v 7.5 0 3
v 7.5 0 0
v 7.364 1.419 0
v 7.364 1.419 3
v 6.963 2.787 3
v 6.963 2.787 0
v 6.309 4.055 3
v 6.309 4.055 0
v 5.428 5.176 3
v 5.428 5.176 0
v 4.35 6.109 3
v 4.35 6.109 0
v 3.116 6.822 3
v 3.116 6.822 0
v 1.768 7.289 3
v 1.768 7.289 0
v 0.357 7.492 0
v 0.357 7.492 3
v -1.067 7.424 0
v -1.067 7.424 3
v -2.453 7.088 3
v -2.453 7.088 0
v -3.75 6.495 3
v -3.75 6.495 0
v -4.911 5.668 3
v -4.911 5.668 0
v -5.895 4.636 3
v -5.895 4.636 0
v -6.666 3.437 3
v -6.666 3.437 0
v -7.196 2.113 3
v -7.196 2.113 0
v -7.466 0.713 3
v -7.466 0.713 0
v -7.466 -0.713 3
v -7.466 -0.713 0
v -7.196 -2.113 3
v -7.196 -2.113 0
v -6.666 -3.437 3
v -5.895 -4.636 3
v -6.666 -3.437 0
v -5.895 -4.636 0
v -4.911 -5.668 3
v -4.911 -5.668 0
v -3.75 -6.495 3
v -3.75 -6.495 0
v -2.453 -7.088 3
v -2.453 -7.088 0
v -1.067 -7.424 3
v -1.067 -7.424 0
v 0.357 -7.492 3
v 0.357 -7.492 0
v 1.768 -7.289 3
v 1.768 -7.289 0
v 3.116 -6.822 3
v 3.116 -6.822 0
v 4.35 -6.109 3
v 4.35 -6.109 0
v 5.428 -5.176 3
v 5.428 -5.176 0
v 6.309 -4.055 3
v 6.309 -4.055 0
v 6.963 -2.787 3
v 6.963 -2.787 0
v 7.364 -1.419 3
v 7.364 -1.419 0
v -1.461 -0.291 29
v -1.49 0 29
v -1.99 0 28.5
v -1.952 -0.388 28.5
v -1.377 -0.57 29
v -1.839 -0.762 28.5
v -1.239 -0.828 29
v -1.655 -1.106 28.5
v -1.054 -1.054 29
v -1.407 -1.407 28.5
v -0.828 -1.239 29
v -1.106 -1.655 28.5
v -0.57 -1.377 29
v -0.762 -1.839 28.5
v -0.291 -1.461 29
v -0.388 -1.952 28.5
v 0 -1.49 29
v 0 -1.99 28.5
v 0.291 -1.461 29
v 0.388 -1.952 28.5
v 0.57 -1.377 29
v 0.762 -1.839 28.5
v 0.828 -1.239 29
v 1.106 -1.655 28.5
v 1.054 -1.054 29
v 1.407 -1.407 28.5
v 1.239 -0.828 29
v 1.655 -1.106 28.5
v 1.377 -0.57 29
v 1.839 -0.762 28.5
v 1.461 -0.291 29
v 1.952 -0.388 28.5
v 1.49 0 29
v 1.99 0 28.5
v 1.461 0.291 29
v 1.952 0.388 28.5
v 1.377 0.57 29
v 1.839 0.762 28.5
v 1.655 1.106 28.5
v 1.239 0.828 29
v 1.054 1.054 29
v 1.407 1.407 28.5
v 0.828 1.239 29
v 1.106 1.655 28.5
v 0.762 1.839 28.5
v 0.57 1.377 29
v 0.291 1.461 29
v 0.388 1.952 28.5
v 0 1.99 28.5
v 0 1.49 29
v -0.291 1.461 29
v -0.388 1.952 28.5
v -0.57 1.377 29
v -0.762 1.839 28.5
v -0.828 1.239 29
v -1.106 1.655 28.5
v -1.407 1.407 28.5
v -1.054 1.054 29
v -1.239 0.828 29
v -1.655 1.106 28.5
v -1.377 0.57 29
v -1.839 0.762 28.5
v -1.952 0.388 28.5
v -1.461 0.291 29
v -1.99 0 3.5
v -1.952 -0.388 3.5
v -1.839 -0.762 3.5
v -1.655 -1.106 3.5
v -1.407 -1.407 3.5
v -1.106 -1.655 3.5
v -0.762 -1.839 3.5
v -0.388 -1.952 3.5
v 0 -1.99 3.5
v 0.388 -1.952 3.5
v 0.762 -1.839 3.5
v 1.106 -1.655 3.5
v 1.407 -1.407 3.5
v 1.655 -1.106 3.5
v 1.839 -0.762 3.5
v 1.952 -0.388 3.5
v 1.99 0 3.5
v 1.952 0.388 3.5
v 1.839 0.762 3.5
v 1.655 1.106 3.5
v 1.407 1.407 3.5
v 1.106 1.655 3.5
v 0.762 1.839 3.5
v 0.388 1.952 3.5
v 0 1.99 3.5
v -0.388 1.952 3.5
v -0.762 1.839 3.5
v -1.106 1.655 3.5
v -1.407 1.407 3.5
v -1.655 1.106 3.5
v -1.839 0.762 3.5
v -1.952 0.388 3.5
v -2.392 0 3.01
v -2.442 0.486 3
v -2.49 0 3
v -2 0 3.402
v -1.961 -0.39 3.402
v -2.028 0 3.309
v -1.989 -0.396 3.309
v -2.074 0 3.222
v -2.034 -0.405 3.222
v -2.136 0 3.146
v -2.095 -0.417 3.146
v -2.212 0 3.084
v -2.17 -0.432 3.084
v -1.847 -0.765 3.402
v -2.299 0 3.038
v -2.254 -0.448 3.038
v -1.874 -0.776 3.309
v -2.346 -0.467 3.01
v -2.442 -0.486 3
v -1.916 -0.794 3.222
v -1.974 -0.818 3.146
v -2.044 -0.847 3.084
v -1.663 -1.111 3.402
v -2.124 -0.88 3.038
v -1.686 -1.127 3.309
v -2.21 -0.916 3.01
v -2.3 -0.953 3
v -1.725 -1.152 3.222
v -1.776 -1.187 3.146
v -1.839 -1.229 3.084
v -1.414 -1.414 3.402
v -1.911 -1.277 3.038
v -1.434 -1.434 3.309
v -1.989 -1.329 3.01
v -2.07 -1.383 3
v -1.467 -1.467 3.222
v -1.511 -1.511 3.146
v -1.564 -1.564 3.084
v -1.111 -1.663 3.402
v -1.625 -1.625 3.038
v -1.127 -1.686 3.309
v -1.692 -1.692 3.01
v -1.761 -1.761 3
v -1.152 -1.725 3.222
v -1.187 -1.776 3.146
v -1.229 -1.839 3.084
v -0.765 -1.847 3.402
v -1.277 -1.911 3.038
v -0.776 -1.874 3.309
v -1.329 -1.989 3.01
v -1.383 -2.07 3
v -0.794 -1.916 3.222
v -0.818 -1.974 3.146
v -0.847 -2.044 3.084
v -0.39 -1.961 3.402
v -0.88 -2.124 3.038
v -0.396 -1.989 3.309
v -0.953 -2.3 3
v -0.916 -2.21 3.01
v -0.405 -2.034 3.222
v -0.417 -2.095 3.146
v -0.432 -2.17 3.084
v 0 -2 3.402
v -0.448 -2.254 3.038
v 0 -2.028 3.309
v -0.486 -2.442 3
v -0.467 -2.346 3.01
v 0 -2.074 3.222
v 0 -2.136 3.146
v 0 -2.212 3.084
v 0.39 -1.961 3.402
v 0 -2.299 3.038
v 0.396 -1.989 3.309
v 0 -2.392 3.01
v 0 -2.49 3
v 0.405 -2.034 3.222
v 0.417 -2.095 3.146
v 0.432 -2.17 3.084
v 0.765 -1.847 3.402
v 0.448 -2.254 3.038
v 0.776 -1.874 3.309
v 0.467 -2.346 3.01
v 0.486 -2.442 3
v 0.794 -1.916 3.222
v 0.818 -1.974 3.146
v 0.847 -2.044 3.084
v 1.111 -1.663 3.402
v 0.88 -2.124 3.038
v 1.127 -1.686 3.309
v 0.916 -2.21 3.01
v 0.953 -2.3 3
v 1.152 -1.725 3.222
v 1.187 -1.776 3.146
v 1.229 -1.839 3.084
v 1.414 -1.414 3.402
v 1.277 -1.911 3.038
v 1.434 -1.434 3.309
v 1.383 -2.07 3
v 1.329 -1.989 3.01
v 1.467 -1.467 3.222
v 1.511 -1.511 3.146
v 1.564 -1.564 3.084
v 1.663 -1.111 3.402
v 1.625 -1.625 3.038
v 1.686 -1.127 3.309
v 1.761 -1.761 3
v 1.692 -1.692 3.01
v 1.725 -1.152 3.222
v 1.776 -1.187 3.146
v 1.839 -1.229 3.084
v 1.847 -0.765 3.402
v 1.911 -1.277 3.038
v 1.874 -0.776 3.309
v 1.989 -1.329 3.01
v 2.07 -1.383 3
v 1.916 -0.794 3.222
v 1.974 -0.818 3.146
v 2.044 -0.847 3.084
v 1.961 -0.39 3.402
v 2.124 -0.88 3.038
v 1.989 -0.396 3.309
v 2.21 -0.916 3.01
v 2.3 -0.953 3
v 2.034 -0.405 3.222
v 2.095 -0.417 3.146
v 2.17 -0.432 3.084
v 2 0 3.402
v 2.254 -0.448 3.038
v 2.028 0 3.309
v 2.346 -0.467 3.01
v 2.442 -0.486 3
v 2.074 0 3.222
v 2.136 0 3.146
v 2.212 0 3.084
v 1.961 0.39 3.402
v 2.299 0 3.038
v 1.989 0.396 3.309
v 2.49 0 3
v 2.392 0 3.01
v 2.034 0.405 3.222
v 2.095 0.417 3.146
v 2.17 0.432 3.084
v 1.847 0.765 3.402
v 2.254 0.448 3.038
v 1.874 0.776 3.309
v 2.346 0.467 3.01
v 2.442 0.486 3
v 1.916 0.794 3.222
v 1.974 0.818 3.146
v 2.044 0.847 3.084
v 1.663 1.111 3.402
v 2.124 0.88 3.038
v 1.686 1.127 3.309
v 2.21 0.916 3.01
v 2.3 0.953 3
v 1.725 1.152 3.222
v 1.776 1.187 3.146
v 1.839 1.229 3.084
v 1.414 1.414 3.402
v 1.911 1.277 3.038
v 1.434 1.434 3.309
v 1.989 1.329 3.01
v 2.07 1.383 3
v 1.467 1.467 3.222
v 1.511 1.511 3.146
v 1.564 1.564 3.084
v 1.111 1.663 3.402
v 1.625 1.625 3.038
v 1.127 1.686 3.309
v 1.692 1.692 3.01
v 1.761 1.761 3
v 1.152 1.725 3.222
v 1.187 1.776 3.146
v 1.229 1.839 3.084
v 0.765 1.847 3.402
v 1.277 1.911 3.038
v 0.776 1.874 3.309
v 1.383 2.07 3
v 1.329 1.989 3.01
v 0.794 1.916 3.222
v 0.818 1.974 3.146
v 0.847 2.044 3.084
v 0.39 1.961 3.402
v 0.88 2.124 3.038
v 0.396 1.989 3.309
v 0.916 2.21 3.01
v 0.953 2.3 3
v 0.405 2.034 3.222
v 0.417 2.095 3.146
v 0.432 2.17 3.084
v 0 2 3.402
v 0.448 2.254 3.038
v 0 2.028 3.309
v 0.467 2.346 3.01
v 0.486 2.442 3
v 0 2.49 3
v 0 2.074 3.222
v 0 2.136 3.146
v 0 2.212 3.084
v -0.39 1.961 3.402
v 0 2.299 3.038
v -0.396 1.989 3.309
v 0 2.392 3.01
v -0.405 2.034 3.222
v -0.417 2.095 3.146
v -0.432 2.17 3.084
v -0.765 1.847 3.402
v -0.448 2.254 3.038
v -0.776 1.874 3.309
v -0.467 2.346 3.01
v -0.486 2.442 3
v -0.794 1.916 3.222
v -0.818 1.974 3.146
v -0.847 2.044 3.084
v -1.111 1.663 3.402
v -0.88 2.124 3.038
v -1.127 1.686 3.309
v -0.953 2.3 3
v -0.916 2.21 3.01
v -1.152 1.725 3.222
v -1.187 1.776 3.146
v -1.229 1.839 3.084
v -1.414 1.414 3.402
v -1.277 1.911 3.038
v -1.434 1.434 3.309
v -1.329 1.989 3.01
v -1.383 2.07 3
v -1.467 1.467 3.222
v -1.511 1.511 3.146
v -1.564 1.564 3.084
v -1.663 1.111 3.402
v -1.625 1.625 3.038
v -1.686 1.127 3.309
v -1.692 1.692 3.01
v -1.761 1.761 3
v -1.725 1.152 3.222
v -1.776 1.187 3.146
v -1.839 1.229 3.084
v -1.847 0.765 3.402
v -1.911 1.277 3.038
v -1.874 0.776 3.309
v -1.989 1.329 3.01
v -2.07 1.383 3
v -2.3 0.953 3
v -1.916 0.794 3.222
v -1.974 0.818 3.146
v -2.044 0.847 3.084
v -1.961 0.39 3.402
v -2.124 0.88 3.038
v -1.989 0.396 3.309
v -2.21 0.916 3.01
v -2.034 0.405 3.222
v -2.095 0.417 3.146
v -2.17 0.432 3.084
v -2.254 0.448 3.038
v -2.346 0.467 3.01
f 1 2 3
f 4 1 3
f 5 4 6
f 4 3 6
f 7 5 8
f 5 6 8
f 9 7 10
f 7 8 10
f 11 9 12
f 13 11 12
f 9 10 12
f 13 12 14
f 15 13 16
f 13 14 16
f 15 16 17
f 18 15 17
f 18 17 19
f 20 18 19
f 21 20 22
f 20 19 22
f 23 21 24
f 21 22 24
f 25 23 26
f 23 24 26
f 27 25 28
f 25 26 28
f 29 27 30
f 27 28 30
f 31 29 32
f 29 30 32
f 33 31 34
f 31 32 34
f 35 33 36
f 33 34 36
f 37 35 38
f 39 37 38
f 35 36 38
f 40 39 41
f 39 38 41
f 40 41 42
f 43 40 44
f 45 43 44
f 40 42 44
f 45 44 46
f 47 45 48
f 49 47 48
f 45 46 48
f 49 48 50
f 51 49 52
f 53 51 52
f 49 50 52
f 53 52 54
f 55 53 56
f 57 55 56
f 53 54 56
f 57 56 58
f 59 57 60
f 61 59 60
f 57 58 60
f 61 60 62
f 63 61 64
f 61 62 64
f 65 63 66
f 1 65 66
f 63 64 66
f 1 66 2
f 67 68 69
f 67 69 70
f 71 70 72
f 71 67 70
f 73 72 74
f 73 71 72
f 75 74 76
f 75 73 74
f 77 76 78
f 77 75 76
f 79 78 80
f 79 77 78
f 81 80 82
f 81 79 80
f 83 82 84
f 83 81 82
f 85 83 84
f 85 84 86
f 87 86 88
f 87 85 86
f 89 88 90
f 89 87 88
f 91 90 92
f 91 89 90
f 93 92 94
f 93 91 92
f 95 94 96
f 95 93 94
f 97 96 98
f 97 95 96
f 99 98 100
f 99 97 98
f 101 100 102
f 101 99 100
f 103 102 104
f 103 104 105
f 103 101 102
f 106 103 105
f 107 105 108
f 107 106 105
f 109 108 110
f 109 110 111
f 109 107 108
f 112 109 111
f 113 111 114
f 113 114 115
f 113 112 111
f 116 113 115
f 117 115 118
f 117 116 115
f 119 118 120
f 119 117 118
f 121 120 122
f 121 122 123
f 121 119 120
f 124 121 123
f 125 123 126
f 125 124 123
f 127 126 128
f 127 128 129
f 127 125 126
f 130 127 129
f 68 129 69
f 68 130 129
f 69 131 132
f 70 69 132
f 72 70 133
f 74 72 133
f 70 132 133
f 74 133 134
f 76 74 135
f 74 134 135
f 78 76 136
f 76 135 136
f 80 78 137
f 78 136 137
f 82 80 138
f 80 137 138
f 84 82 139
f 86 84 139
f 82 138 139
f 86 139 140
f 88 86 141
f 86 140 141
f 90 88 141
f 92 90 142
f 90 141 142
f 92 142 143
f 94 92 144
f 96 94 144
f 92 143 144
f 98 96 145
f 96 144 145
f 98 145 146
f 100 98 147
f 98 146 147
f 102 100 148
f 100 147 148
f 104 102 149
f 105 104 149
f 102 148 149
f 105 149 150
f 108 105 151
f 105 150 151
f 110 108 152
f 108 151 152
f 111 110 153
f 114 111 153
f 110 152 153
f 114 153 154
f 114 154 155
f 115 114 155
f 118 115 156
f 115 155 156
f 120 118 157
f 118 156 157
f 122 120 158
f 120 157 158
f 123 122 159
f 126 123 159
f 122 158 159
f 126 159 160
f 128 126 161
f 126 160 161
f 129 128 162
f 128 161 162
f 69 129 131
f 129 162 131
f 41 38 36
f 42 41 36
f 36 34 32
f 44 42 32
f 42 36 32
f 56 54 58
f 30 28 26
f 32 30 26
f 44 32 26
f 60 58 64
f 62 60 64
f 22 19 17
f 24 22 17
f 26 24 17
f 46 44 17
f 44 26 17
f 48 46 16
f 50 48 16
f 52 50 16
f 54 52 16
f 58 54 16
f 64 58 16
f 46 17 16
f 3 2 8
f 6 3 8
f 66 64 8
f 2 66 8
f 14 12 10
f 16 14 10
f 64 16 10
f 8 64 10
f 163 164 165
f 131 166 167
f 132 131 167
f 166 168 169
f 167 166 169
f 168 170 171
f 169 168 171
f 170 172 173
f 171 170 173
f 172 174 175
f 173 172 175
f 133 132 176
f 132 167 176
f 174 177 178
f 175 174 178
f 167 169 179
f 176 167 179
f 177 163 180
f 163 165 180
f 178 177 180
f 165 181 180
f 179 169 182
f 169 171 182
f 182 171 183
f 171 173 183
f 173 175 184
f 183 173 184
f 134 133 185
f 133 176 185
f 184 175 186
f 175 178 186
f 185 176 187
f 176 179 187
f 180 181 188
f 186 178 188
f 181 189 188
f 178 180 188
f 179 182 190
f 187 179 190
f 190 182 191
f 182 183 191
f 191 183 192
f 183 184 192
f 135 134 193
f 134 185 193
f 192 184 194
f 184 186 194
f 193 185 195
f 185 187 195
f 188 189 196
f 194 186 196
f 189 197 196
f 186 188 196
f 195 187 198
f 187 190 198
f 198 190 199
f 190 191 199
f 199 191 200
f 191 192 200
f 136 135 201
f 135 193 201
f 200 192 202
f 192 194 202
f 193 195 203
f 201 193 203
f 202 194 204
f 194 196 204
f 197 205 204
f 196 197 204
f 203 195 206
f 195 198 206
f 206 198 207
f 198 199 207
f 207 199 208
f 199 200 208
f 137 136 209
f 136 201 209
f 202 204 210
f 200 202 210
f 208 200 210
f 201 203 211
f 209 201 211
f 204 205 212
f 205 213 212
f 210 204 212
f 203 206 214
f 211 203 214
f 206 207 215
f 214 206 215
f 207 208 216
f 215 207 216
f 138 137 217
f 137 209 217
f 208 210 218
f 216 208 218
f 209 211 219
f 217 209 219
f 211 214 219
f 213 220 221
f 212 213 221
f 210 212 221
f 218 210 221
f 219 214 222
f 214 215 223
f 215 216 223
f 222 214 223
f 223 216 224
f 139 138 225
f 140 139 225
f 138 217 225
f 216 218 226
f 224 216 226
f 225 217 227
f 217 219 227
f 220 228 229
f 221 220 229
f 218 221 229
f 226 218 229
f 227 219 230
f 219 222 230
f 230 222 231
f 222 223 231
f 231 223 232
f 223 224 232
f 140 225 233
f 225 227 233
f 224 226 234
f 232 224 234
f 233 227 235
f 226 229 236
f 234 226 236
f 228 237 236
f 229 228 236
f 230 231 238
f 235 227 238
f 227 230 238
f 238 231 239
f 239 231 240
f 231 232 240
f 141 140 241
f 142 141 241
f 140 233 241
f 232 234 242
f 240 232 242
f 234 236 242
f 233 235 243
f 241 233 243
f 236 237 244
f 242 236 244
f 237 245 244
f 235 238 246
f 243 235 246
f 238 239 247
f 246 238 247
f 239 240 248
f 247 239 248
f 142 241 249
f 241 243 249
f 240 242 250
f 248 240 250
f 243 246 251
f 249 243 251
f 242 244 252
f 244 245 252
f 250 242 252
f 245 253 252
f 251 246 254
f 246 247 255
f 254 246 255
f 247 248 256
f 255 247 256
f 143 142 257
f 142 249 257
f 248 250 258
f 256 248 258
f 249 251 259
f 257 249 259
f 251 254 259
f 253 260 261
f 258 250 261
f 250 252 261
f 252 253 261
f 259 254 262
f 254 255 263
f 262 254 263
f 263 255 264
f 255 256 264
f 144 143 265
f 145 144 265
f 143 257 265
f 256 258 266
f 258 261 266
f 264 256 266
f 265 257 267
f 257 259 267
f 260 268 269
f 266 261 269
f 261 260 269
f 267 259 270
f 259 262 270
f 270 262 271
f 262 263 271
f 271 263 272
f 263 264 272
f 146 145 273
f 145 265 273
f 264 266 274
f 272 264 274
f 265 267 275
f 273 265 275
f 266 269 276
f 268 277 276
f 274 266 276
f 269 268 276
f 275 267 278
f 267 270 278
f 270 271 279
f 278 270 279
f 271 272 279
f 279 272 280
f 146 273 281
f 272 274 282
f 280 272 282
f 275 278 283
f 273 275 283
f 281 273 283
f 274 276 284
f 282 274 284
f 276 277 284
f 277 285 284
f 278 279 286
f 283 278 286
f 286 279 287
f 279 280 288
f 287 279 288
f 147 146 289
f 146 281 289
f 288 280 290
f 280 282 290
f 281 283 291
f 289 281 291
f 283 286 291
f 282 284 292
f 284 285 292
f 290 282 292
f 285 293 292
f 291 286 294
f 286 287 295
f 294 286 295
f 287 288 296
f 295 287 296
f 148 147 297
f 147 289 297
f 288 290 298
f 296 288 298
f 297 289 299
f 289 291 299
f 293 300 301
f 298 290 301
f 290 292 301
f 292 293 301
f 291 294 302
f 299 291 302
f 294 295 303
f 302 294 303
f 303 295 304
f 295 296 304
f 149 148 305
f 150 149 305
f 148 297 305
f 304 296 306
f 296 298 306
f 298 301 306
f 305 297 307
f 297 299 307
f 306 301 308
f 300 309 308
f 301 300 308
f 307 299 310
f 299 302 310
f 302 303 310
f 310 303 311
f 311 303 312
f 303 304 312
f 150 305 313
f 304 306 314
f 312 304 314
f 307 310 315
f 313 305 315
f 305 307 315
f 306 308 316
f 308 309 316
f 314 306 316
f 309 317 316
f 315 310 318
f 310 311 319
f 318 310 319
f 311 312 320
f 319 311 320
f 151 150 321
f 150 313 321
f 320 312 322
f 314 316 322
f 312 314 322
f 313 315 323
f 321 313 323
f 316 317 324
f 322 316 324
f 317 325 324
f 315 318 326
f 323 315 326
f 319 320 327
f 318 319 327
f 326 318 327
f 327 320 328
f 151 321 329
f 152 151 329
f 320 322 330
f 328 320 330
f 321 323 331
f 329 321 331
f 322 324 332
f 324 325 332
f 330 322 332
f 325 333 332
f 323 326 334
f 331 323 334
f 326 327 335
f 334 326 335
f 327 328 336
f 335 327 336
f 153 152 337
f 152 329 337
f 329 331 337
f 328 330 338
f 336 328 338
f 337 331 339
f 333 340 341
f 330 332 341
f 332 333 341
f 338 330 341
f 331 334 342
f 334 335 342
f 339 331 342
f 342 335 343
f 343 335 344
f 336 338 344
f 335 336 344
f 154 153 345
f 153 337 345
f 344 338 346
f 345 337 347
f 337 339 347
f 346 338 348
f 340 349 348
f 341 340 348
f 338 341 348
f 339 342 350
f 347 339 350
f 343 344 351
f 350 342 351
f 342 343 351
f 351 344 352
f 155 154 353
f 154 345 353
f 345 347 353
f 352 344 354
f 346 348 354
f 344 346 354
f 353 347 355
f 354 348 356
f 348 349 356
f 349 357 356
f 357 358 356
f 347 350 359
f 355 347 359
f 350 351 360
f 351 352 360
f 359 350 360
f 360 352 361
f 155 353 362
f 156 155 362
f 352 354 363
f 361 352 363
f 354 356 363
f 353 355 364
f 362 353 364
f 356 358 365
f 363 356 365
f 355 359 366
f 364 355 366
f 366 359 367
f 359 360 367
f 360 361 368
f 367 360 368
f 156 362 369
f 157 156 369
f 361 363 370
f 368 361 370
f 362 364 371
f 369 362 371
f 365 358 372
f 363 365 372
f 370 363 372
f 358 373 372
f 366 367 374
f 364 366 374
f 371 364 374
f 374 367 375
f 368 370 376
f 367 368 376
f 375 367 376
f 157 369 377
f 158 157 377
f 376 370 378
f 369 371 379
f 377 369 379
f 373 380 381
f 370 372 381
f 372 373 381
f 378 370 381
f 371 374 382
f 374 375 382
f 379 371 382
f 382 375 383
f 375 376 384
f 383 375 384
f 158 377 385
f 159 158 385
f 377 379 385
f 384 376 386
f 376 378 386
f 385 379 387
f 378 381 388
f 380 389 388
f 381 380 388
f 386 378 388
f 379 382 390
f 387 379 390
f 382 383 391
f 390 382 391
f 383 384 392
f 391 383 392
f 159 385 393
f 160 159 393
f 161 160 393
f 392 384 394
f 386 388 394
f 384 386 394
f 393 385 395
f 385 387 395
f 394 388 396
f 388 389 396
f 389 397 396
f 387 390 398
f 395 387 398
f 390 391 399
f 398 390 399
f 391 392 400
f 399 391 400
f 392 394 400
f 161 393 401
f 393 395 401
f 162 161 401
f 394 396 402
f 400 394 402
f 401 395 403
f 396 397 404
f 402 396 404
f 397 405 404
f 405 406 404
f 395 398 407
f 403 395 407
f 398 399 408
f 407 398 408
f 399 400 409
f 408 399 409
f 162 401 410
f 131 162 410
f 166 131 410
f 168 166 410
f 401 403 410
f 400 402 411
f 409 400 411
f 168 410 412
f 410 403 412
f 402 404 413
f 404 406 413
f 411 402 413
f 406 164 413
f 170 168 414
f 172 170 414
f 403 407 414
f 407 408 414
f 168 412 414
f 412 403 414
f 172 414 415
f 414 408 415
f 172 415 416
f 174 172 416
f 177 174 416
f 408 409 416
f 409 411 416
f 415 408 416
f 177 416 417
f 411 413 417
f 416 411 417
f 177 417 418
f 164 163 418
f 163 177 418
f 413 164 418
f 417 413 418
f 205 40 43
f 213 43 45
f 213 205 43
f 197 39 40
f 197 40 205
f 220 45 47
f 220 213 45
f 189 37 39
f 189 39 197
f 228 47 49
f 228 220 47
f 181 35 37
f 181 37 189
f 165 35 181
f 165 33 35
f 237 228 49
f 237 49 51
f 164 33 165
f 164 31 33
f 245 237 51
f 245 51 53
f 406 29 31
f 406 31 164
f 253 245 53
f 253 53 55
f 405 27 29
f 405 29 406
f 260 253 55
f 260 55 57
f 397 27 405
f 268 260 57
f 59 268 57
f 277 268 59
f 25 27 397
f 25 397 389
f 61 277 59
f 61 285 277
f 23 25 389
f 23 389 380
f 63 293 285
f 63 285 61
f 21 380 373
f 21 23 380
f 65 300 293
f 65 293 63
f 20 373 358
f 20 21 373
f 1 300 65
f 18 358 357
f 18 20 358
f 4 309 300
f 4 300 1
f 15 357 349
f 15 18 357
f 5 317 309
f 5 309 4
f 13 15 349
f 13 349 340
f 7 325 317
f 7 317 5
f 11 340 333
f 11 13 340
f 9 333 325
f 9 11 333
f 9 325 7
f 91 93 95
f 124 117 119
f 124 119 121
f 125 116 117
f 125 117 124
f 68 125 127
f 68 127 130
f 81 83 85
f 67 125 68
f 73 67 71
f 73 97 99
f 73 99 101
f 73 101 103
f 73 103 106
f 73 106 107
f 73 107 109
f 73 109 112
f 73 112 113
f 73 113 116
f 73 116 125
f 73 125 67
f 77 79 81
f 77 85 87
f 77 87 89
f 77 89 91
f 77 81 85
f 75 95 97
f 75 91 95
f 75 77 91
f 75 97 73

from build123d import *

# Parameters (mm, degrees)
SKETCH1_R           = 7.5
BOSS_EXTRUDE1_DEPTH = 3
SKETCH2_R           = 1.99
BOSS_EXTRUDE2_DEPTH = 26
CHAMFER1_SIZE       = 0.5
FILLET1_R           = 0.5


with BuildPart() as part:
    # Sketch1 → Boss-Extrude1 (new body)
    with BuildSketch(Plane.XY):
        Circle(SKETCH1_R)
    extrude(amount=BOSS_EXTRUDE1_DEPTH)

    # Sketch2 → Boss-Extrude2 (add)
    with BuildSketch(Plane.XY.offset(3)):
        with Locations(Location((0, 0, 0), (0, 0, 180))):
            Circle(SKETCH2_R)
    extrude(amount=BOSS_EXTRUDE2_DEPTH)

    # Chamfer1
    chamfer1_edges = [part.edges().sort_by_distance(p)[0] for p in [
        (1.99, 0, 29),
    ]]
    chamfer(chamfer1_edges, length=CHAMFER1_SIZE)

    # Fillet1
    fillet1_edges = [part.edges().sort_by_distance(p)[0] for p in [
        (1.99, 0, 3),
    ]]
    fillet(fillet1_edges, radius=FILLET1_R)


solid = part.part
